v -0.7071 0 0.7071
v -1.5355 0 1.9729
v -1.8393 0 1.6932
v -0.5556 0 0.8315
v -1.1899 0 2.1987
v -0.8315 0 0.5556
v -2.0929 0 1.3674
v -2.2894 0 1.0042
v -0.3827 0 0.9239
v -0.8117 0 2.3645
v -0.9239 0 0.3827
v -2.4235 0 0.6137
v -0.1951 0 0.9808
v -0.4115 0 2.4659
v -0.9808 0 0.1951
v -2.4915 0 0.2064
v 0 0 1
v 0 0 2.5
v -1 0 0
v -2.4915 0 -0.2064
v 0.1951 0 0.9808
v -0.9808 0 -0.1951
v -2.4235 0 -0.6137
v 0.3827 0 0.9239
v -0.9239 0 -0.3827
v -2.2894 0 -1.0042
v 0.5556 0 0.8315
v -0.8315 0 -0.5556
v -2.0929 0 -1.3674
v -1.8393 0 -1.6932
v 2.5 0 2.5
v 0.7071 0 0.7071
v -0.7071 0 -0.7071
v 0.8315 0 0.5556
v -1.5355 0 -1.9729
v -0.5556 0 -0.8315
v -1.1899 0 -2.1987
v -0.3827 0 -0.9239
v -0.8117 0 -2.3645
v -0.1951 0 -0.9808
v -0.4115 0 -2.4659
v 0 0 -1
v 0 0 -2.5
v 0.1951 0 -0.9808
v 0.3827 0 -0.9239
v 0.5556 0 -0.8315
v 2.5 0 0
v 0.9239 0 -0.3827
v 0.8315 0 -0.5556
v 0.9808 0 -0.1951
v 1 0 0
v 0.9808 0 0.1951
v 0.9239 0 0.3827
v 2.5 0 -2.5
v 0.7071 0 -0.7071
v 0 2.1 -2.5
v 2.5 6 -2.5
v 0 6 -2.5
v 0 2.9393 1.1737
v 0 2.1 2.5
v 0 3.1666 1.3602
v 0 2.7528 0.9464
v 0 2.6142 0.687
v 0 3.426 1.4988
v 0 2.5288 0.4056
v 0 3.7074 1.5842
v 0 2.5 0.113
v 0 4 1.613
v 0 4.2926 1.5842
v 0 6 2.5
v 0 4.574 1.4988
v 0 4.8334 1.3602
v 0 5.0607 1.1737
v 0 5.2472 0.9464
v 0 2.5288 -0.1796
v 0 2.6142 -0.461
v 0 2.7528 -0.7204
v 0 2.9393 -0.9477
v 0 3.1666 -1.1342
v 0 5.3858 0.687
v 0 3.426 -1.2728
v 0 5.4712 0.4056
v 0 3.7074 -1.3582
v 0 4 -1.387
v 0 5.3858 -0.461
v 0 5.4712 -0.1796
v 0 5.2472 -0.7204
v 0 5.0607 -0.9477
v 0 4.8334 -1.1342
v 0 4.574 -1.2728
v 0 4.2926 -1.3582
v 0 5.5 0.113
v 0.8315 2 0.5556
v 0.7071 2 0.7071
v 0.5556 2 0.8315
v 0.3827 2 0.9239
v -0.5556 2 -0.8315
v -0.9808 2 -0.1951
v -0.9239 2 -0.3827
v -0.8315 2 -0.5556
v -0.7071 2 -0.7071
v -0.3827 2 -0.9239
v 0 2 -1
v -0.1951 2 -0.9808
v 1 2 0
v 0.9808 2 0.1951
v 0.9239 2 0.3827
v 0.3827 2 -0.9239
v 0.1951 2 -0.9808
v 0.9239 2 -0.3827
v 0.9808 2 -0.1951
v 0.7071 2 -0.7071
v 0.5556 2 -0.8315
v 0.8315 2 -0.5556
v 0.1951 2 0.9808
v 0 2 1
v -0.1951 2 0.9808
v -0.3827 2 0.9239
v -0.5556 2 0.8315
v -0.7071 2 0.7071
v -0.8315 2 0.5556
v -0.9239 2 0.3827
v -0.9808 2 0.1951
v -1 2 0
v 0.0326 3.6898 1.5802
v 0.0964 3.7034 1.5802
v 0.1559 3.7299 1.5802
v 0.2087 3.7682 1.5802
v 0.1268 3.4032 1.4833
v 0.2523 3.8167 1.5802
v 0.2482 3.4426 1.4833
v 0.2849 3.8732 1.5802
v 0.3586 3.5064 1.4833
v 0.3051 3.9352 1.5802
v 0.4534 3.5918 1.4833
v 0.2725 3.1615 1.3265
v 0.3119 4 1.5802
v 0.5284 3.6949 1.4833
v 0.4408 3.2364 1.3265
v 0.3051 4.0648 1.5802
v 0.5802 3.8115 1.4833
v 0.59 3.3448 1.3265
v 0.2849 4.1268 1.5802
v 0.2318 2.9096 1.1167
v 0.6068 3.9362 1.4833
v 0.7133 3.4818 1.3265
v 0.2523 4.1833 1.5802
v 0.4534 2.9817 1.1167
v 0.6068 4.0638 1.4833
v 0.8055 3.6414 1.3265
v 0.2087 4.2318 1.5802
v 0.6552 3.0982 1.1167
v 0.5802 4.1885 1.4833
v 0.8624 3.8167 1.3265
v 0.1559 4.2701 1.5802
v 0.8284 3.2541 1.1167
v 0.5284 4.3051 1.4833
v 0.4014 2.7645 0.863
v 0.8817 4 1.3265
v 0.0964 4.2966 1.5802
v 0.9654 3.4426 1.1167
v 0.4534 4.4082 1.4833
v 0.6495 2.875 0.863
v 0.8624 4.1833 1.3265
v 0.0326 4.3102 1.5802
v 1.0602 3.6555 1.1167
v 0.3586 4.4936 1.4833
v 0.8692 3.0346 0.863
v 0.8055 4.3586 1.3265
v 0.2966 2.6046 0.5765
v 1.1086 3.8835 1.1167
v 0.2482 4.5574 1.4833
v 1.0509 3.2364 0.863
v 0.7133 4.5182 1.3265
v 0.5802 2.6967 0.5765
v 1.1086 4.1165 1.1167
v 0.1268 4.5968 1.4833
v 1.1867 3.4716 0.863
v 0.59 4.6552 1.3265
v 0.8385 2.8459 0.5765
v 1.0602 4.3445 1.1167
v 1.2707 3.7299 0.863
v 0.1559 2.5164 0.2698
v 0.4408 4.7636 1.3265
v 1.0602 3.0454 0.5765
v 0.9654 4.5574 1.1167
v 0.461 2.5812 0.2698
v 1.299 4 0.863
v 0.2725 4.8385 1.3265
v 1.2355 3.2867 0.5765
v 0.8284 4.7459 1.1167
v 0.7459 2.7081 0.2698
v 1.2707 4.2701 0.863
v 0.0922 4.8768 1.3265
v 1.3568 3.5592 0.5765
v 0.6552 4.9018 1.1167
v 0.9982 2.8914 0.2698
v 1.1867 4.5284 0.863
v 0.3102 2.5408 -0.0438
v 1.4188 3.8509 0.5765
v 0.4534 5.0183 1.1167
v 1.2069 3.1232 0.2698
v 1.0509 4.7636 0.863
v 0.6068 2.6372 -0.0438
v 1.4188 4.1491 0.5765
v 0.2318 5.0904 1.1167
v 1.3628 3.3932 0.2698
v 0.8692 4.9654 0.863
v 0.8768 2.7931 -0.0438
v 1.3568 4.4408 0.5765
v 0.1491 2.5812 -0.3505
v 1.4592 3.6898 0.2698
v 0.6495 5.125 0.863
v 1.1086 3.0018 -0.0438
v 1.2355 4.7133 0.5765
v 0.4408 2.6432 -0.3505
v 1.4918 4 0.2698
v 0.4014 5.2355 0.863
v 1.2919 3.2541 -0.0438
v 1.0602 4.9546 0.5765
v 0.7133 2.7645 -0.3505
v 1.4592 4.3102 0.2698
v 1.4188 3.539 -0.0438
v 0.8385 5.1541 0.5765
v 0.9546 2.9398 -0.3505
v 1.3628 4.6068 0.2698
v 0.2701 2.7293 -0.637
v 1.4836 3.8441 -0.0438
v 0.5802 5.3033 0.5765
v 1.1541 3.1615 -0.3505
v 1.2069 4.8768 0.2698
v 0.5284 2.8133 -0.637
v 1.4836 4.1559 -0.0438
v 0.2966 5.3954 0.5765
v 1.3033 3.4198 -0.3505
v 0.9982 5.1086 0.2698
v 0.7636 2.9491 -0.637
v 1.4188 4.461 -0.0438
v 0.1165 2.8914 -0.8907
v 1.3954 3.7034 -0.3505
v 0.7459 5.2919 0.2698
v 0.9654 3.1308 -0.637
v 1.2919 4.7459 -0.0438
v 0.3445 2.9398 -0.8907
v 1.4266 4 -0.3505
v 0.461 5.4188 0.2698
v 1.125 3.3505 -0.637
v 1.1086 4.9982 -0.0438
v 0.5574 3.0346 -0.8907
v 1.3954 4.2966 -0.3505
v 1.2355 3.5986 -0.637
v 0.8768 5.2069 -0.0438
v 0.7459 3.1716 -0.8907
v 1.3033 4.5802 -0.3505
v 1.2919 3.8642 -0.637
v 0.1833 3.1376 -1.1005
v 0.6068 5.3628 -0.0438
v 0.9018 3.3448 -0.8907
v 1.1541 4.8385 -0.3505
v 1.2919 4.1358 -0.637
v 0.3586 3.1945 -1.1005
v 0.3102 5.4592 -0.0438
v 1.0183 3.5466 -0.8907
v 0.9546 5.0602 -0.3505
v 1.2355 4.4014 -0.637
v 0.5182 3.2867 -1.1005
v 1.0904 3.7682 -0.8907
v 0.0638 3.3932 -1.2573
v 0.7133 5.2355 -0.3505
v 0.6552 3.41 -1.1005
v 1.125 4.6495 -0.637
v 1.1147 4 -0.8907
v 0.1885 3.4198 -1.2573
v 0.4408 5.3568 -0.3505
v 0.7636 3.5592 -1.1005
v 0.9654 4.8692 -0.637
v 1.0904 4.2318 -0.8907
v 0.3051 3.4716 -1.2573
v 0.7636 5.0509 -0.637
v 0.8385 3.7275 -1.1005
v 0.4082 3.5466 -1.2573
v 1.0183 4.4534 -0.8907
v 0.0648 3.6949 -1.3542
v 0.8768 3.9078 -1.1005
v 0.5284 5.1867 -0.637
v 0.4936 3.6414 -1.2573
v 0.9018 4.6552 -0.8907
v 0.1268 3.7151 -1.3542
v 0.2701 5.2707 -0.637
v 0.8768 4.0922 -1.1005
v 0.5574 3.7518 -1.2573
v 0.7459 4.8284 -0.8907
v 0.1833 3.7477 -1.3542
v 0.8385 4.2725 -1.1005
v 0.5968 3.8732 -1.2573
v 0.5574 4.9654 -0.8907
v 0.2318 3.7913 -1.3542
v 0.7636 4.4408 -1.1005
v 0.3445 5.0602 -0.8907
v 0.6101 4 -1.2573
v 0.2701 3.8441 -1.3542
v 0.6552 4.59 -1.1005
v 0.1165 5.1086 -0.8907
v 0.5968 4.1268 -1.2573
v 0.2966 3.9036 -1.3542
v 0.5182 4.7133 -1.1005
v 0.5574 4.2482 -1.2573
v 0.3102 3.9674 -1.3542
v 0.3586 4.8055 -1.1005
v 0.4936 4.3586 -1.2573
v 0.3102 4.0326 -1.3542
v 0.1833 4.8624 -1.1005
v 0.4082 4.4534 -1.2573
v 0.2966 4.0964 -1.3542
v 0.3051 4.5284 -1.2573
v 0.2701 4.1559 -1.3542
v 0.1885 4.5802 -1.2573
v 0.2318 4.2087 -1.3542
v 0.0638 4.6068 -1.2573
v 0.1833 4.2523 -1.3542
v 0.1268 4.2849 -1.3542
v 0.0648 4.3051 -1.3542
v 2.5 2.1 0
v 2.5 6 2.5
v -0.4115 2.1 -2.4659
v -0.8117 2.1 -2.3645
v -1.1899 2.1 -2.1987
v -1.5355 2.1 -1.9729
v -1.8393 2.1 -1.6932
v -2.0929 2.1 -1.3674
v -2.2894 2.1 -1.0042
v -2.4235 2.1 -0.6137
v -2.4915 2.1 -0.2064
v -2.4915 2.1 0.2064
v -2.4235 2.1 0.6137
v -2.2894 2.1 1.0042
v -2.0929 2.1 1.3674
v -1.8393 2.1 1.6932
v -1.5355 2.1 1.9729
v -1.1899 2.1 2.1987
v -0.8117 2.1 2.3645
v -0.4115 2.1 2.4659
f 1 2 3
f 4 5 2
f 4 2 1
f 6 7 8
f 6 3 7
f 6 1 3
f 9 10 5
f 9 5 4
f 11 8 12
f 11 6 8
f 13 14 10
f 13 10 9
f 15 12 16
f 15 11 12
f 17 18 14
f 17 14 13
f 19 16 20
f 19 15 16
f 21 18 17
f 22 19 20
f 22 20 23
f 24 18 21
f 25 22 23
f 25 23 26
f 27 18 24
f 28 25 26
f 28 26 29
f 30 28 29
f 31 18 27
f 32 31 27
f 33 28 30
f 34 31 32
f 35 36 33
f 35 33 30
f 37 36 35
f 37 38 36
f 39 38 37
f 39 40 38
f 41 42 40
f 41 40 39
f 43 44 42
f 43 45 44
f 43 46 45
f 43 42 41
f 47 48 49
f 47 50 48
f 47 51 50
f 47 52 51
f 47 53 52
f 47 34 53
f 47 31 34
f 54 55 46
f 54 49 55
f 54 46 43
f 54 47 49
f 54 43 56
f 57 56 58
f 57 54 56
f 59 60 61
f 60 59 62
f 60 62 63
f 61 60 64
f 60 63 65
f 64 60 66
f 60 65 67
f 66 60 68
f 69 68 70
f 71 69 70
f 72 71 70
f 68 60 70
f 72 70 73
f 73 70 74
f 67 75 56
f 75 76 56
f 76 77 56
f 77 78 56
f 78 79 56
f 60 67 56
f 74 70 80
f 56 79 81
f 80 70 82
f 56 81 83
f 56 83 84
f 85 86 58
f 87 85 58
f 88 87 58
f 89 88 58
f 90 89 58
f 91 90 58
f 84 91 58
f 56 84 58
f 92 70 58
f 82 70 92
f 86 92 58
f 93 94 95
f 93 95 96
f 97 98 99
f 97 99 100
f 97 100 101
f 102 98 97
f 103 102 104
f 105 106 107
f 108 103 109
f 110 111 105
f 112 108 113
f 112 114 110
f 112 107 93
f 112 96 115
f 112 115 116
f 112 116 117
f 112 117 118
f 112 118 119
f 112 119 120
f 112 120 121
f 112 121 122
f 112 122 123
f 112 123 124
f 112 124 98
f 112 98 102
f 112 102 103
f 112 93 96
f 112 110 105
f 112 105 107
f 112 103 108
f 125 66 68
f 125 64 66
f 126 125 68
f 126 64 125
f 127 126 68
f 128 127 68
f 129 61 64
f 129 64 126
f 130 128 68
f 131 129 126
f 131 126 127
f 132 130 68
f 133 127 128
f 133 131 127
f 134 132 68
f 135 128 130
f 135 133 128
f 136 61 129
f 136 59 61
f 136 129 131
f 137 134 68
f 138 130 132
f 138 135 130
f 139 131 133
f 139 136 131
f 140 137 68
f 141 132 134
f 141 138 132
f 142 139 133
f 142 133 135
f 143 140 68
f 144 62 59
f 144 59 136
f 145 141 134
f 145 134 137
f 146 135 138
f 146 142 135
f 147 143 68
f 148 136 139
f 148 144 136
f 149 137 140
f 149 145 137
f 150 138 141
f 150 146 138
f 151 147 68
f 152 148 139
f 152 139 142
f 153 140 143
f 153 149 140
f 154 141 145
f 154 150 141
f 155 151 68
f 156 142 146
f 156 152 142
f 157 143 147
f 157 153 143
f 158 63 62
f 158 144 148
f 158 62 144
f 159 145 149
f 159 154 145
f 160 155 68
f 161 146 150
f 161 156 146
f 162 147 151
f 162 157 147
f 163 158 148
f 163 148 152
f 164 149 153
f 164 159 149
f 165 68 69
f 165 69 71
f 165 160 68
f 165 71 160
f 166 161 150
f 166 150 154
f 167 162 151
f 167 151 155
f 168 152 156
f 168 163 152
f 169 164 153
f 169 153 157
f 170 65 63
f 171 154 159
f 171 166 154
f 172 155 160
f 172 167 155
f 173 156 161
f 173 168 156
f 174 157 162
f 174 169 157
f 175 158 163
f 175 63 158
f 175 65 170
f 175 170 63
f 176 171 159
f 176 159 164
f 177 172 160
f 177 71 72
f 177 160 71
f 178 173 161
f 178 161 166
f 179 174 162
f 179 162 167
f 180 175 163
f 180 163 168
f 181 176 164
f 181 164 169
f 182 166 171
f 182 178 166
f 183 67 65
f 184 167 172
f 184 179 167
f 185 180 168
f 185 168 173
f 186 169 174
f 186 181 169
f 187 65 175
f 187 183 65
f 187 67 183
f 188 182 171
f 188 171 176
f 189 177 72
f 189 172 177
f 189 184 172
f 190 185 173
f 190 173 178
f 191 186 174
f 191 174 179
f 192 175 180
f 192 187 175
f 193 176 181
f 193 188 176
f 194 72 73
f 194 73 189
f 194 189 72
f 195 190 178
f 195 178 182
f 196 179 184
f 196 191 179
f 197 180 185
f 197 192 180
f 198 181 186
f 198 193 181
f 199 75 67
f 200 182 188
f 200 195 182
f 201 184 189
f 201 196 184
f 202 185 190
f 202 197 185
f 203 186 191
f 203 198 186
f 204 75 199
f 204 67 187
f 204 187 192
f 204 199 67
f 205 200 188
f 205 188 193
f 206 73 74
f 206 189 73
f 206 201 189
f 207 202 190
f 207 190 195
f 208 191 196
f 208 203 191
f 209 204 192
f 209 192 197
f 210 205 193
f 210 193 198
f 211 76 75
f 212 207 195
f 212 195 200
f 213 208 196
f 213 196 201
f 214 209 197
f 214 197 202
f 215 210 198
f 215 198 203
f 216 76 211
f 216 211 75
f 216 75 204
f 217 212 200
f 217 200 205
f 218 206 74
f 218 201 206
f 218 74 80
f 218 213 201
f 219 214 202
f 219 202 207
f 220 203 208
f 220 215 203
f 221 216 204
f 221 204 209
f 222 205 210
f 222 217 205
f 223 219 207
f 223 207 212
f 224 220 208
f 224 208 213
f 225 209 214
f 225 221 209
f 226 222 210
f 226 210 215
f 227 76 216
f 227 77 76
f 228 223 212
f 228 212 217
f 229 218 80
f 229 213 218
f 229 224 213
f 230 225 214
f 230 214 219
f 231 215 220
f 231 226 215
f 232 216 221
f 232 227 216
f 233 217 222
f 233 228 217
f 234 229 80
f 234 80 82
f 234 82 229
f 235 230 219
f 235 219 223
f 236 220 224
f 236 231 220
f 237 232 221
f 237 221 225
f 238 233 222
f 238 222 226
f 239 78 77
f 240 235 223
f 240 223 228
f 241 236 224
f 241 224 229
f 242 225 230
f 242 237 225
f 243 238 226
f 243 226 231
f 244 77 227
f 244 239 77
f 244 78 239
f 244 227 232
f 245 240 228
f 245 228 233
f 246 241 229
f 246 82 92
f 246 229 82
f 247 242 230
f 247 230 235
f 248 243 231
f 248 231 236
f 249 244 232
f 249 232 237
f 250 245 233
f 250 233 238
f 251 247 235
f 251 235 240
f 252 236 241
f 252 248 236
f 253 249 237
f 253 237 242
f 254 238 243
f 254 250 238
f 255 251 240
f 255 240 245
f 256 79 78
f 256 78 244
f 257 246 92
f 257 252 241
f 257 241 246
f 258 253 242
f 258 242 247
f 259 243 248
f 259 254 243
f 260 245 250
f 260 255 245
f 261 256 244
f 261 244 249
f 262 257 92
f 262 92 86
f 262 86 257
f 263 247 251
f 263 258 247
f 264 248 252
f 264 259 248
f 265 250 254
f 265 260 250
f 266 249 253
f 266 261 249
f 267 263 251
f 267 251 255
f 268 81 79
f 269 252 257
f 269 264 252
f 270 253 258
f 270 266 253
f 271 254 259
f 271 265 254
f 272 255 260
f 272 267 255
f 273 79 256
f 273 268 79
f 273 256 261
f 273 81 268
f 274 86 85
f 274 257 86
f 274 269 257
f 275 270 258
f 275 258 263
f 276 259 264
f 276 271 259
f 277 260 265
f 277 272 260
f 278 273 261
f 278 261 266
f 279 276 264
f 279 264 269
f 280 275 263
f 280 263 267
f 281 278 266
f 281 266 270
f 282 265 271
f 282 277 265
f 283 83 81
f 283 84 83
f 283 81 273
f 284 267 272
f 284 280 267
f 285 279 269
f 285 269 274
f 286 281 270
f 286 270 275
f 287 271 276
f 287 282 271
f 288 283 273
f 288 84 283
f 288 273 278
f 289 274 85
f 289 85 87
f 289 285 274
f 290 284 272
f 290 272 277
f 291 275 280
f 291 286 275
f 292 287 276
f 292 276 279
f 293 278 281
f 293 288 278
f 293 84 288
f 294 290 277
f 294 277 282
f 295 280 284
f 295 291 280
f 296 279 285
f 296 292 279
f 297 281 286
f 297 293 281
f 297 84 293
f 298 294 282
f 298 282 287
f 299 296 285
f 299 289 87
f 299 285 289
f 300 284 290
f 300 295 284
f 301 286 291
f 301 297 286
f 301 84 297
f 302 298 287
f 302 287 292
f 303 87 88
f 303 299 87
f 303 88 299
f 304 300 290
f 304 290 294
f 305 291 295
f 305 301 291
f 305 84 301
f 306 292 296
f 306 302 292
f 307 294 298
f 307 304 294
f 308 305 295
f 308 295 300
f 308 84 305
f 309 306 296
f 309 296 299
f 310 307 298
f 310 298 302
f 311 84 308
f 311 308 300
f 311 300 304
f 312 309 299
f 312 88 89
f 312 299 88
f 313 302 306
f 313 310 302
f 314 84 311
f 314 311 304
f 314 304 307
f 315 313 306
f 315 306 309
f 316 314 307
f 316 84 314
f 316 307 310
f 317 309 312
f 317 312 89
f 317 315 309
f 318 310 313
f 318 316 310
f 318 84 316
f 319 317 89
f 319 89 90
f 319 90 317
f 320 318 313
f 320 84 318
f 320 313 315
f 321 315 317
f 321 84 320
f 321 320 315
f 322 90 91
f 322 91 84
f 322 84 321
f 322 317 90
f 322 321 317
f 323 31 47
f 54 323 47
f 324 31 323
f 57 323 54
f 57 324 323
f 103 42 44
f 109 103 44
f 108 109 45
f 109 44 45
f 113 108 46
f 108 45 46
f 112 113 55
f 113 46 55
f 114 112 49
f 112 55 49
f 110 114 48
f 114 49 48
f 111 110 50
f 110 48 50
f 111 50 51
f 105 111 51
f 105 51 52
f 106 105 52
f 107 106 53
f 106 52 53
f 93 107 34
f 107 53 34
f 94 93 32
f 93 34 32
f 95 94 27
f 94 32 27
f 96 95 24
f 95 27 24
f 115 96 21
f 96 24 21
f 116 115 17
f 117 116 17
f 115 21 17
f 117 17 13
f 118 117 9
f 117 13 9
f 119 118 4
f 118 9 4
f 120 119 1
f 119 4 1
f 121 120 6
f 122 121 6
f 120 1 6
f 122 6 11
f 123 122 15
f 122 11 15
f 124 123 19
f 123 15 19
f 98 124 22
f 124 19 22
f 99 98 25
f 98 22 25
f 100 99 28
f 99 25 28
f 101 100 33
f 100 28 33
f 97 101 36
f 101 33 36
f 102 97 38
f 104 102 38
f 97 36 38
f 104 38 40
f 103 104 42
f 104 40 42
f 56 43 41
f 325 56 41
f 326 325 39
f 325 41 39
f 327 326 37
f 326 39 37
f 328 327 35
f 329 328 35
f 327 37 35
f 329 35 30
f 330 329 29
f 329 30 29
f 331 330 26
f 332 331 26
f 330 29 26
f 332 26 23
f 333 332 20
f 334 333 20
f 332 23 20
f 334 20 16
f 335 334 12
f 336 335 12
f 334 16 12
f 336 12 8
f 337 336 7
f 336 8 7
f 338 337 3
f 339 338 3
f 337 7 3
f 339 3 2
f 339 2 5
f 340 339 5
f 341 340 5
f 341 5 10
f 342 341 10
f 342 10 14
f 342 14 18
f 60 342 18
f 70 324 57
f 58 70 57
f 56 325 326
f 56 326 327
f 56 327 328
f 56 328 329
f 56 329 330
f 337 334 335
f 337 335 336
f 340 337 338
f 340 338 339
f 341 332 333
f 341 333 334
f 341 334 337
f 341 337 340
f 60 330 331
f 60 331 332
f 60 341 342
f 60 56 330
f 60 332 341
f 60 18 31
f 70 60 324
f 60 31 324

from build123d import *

# Parameters (mm, degrees)
SKETCH1_R           = 2.5
BOSS_EXTRUDE2_DEPTH = 2.1
SKETCH10_W          = 5
SKETCH10_H          = 6
BOSS_EXTRUDE5_DEPTH = 2.5
SKETCH12_R          = 1
CUT_EXTRUDE1_DEPTH  = 2


with BuildPart() as part:
    # Sketch1 → Boss-Extrude2 (new body)
    with BuildSketch(Plane(origin=(0, 0, 0), x_dir=(1, 0, 0), z_dir=(0, 1, 0))):
        with Locations(Location((0, 0, 0), (0, 0, 270))):
            Circle(SKETCH1_R)
    extrude(amount=BOSS_EXTRUDE2_DEPTH)

    # Sketch10 → Boss-Extrude5 (add)
    with BuildSketch(Plane(origin=(2.5, 0, 0), x_dir=(0, 0, -1), z_dir=(1, 0, 0))):
        with Locations((0, 3)):
            Rectangle(SKETCH10_W, SKETCH10_H)
    extrude(amount=-BOSS_EXTRUDE5_DEPTH)

    # Sketch11 → Cut-Revolve2 (revolve, cut)
    with BuildSketch(Plane.ZY):
        with BuildLine():
            Line((-1.386997153, 4), (1.613002847, 4))
            ThreePointArc((1.613002847, 4), (0.113002847, 5.5), (-1.386997153, 4))
        make_face()
    revolve(axis=Axis((0, 4, -1.386997153), (0, 0, 1)), mode=Mode.SUBTRACT)

    # Sketch12 → Cut-Extrude1 (cut)
    with BuildSketch(Plane.XZ):
        with Locations(Location((0, 0, 0), (0, 0, 270))):
            Circle(SKETCH12_R)
    extrude(amount=-CUT_EXTRUDE1_DEPTH, mode=Mode.SUBTRACT)


solid = part.part
